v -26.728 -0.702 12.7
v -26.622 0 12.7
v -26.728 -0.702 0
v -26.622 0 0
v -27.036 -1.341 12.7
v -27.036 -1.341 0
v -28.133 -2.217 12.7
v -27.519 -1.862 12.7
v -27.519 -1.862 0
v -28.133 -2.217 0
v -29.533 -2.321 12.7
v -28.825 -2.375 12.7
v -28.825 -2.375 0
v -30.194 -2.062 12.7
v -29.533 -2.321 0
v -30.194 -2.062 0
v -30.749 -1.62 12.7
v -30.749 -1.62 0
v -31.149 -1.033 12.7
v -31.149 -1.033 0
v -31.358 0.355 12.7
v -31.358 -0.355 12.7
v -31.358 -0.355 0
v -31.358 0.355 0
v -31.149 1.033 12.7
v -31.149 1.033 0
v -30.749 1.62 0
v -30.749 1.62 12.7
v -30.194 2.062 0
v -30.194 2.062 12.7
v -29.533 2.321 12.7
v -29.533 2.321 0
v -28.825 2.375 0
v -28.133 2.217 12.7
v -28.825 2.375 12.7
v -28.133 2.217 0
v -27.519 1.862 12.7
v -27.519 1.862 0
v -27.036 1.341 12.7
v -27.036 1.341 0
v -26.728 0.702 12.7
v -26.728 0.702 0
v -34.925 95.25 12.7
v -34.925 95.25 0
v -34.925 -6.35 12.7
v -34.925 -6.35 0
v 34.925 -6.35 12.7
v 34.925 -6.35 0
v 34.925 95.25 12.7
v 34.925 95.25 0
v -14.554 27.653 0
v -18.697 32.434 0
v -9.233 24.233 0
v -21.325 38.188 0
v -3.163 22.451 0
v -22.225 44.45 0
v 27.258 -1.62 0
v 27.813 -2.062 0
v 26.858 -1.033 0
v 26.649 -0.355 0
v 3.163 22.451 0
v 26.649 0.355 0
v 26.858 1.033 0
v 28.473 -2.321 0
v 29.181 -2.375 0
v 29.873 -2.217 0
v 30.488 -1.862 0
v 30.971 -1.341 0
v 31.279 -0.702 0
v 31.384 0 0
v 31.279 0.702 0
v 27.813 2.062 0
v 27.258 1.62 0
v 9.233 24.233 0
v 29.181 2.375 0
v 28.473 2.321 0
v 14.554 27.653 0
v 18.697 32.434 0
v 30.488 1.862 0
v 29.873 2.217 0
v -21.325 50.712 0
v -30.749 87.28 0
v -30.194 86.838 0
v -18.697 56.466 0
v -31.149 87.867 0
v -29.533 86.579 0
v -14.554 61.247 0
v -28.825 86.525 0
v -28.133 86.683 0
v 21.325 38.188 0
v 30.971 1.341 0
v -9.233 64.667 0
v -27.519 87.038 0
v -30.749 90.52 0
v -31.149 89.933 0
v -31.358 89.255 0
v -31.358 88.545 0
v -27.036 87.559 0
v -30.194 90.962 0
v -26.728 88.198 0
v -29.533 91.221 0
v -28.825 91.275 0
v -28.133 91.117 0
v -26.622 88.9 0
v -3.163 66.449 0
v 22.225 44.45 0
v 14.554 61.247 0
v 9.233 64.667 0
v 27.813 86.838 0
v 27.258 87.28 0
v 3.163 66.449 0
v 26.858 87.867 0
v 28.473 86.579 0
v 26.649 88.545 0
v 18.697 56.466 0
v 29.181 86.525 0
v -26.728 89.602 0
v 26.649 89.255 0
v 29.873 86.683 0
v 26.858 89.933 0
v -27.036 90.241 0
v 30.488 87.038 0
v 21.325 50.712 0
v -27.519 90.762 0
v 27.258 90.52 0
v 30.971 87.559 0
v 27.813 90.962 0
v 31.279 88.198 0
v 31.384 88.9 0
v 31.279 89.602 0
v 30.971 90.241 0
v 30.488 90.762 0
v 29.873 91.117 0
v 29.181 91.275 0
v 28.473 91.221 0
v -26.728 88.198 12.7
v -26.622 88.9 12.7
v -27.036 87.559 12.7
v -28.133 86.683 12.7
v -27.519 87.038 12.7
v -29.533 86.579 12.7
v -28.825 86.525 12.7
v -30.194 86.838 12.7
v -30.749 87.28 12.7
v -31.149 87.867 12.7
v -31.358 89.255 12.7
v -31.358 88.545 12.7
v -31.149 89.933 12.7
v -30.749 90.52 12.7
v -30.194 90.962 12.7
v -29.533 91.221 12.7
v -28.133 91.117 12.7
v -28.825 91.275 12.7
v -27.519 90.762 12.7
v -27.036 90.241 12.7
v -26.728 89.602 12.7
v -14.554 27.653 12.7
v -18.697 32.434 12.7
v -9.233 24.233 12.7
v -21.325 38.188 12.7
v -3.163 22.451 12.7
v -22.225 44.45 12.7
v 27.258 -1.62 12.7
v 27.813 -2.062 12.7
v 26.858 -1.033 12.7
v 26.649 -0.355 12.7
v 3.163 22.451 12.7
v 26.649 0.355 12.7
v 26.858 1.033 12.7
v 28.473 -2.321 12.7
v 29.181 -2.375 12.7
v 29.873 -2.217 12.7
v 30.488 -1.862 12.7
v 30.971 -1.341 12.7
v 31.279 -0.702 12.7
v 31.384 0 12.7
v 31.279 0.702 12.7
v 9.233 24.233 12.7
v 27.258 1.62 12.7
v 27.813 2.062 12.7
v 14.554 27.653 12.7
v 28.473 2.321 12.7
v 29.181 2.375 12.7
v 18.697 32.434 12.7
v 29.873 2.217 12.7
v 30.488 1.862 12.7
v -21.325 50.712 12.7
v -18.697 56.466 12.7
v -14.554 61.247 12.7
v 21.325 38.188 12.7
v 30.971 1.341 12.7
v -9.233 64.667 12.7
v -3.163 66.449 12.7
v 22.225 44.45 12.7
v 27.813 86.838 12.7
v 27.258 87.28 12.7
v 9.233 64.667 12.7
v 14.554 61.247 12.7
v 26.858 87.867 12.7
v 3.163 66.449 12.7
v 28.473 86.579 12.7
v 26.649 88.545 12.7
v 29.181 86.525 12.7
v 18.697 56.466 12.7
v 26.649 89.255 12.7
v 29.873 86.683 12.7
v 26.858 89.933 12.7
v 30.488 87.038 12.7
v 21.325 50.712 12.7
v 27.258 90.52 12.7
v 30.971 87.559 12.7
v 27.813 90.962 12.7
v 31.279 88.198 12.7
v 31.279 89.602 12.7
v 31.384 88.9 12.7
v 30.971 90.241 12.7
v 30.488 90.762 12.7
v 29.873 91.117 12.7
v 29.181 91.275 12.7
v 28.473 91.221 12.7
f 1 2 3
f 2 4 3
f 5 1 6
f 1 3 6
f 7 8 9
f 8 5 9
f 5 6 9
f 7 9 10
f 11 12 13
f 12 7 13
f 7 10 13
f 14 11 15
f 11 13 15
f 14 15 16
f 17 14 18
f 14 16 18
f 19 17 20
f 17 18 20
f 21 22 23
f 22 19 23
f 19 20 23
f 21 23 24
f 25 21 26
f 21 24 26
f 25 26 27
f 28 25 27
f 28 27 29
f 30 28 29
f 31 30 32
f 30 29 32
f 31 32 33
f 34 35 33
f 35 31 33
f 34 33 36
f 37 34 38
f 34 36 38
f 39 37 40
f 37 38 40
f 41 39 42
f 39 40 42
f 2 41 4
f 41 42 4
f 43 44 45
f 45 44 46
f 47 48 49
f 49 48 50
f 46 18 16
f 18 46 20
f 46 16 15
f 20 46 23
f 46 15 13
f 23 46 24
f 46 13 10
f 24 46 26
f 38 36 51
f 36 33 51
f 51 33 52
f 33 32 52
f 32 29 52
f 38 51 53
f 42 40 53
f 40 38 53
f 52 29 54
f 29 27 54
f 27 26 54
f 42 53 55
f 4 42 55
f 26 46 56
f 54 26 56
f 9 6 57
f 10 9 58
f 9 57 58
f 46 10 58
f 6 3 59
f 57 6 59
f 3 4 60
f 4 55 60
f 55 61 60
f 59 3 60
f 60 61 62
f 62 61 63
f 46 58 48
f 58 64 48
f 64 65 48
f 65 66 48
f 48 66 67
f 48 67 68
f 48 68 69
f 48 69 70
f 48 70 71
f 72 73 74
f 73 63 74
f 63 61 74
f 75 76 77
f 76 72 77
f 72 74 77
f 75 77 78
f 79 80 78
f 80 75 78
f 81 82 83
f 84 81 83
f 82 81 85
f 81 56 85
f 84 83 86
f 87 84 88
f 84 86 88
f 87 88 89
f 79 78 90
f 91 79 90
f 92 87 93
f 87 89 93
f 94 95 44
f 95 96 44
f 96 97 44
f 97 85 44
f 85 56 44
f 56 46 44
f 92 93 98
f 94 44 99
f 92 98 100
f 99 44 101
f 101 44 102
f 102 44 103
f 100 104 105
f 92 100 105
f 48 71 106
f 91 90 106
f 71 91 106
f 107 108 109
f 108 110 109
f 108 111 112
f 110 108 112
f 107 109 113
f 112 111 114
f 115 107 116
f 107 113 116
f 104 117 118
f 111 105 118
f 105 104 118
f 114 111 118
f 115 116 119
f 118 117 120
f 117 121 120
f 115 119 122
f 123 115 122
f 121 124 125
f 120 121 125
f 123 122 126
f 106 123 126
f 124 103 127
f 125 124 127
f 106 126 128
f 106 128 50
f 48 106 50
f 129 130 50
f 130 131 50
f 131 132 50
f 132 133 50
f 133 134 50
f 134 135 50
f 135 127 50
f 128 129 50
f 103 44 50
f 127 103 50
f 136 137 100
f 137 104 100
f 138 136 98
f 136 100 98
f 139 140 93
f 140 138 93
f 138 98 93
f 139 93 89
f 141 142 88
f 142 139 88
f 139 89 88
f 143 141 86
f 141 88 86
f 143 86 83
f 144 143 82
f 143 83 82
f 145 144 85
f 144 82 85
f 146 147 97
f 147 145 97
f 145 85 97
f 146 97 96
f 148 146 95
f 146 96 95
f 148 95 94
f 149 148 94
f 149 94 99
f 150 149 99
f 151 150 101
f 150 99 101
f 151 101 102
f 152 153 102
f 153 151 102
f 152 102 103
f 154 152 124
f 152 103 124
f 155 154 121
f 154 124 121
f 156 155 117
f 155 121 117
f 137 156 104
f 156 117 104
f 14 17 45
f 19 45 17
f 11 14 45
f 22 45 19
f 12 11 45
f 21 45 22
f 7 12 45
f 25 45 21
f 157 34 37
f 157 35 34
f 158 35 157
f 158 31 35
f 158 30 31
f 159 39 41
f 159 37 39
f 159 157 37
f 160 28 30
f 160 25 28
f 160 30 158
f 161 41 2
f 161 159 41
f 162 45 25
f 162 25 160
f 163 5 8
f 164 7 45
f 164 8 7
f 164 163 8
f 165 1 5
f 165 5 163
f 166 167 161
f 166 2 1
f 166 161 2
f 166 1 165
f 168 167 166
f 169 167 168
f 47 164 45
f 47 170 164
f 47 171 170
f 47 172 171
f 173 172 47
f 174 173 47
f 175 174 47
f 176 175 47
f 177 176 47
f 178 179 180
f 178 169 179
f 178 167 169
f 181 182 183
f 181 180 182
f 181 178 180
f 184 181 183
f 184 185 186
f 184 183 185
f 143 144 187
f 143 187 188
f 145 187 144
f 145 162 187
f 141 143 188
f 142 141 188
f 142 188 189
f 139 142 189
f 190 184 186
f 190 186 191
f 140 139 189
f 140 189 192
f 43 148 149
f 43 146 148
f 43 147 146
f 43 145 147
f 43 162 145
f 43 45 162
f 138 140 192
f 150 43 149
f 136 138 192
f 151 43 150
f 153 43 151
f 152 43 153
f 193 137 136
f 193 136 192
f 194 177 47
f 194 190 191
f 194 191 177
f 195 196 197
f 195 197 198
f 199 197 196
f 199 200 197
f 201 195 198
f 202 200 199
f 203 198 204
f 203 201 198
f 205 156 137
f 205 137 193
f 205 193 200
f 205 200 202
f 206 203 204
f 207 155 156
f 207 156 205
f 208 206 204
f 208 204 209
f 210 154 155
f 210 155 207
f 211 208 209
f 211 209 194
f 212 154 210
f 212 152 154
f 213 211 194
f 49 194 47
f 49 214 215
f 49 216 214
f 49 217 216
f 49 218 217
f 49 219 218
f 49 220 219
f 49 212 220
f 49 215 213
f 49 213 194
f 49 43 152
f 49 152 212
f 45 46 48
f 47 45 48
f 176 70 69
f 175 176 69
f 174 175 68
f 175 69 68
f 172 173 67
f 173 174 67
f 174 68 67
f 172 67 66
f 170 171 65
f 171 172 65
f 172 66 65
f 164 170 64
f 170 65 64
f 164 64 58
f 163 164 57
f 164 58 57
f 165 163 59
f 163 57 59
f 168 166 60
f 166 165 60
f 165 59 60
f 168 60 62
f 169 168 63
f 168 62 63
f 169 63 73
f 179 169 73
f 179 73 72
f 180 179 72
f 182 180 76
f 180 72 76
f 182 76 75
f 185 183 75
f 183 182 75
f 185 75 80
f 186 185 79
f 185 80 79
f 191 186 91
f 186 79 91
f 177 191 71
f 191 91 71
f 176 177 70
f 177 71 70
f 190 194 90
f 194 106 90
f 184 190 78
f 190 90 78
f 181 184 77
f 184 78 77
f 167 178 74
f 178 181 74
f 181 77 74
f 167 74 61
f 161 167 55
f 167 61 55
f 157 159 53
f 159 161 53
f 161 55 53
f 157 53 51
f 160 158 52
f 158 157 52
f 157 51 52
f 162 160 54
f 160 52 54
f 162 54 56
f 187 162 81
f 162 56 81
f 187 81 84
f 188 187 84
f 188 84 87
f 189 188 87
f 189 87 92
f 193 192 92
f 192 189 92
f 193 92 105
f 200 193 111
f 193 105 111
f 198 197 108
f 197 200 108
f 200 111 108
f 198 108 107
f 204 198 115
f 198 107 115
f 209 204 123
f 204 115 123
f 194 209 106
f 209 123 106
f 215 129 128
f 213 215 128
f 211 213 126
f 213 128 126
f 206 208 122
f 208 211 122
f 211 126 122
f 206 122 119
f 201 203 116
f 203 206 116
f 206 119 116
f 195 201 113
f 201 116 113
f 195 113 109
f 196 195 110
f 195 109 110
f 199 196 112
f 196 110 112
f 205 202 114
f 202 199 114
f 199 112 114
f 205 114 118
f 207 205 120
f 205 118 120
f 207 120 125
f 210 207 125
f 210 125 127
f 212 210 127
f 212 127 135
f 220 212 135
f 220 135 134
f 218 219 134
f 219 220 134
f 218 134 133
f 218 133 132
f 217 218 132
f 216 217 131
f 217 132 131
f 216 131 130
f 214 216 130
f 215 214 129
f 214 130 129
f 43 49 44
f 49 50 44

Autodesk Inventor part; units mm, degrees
ref_plane "YZ Plane" through (0, 0, 0) normal (1, 0, 0) x (0, 1, 0)
ref_plane "XZ Plane" through (0, 0, 0) normal (0, 1, 0) x (-1, 0, 0)
sketch "Sketch1" plane through (0, 0, 0) normal (0, 0, 1) x (1, 0, 0)
  line L0 (34.925, 95.25) -> (-34.925, 95.25) projected
  line L1 (-34.925, 95.25) -> (-34.925, 82.55) projected
  line L2 (-34.925, 82.55) -> (34.925, 82.55) projected
  line L3 (34.925, 82.55) -> (34.925, 95.25) projected
  circle A0 centre (-29.0032, 88.9) radius 2.3812 projected
  circle A1 centre (29.0032, 88.9) radius 2.3812 projected
  line L4 (34.925, 6.35) -> (-34.925, 6.35) projected
  line L5 (-34.925, 6.35) -> (-34.925, -6.35) projected
  line L6 (-34.925, -6.35) -> (34.925, -6.35) projected
  line L7 (34.925, -6.35) -> (34.925, 6.35) projected
  circle A2 centre (-29.0032, 0) radius 2.3812 projected
  circle A3 centre (29.0032, 0) radius 2.3812 projected
  line L8 (34.925, 82.55) -> (34.925, 6.35)
  line L9 (-34.925, 6.35) -> (-34.925, 82.55)
  circle A4 centre (0, 44.45) radius 22.225
  point P0 (0, 0)
  dimension "d0" = 44.45
extrude "Extrusion1" add sketch "Sketch1" along normal blind 12.7
ref_plane "Work Plane1" through (-19.4127, 25.0373, 33.395) normal (0, 0, -1) x (0, 1, 0)
properties part number "Encoder Mount Y"
